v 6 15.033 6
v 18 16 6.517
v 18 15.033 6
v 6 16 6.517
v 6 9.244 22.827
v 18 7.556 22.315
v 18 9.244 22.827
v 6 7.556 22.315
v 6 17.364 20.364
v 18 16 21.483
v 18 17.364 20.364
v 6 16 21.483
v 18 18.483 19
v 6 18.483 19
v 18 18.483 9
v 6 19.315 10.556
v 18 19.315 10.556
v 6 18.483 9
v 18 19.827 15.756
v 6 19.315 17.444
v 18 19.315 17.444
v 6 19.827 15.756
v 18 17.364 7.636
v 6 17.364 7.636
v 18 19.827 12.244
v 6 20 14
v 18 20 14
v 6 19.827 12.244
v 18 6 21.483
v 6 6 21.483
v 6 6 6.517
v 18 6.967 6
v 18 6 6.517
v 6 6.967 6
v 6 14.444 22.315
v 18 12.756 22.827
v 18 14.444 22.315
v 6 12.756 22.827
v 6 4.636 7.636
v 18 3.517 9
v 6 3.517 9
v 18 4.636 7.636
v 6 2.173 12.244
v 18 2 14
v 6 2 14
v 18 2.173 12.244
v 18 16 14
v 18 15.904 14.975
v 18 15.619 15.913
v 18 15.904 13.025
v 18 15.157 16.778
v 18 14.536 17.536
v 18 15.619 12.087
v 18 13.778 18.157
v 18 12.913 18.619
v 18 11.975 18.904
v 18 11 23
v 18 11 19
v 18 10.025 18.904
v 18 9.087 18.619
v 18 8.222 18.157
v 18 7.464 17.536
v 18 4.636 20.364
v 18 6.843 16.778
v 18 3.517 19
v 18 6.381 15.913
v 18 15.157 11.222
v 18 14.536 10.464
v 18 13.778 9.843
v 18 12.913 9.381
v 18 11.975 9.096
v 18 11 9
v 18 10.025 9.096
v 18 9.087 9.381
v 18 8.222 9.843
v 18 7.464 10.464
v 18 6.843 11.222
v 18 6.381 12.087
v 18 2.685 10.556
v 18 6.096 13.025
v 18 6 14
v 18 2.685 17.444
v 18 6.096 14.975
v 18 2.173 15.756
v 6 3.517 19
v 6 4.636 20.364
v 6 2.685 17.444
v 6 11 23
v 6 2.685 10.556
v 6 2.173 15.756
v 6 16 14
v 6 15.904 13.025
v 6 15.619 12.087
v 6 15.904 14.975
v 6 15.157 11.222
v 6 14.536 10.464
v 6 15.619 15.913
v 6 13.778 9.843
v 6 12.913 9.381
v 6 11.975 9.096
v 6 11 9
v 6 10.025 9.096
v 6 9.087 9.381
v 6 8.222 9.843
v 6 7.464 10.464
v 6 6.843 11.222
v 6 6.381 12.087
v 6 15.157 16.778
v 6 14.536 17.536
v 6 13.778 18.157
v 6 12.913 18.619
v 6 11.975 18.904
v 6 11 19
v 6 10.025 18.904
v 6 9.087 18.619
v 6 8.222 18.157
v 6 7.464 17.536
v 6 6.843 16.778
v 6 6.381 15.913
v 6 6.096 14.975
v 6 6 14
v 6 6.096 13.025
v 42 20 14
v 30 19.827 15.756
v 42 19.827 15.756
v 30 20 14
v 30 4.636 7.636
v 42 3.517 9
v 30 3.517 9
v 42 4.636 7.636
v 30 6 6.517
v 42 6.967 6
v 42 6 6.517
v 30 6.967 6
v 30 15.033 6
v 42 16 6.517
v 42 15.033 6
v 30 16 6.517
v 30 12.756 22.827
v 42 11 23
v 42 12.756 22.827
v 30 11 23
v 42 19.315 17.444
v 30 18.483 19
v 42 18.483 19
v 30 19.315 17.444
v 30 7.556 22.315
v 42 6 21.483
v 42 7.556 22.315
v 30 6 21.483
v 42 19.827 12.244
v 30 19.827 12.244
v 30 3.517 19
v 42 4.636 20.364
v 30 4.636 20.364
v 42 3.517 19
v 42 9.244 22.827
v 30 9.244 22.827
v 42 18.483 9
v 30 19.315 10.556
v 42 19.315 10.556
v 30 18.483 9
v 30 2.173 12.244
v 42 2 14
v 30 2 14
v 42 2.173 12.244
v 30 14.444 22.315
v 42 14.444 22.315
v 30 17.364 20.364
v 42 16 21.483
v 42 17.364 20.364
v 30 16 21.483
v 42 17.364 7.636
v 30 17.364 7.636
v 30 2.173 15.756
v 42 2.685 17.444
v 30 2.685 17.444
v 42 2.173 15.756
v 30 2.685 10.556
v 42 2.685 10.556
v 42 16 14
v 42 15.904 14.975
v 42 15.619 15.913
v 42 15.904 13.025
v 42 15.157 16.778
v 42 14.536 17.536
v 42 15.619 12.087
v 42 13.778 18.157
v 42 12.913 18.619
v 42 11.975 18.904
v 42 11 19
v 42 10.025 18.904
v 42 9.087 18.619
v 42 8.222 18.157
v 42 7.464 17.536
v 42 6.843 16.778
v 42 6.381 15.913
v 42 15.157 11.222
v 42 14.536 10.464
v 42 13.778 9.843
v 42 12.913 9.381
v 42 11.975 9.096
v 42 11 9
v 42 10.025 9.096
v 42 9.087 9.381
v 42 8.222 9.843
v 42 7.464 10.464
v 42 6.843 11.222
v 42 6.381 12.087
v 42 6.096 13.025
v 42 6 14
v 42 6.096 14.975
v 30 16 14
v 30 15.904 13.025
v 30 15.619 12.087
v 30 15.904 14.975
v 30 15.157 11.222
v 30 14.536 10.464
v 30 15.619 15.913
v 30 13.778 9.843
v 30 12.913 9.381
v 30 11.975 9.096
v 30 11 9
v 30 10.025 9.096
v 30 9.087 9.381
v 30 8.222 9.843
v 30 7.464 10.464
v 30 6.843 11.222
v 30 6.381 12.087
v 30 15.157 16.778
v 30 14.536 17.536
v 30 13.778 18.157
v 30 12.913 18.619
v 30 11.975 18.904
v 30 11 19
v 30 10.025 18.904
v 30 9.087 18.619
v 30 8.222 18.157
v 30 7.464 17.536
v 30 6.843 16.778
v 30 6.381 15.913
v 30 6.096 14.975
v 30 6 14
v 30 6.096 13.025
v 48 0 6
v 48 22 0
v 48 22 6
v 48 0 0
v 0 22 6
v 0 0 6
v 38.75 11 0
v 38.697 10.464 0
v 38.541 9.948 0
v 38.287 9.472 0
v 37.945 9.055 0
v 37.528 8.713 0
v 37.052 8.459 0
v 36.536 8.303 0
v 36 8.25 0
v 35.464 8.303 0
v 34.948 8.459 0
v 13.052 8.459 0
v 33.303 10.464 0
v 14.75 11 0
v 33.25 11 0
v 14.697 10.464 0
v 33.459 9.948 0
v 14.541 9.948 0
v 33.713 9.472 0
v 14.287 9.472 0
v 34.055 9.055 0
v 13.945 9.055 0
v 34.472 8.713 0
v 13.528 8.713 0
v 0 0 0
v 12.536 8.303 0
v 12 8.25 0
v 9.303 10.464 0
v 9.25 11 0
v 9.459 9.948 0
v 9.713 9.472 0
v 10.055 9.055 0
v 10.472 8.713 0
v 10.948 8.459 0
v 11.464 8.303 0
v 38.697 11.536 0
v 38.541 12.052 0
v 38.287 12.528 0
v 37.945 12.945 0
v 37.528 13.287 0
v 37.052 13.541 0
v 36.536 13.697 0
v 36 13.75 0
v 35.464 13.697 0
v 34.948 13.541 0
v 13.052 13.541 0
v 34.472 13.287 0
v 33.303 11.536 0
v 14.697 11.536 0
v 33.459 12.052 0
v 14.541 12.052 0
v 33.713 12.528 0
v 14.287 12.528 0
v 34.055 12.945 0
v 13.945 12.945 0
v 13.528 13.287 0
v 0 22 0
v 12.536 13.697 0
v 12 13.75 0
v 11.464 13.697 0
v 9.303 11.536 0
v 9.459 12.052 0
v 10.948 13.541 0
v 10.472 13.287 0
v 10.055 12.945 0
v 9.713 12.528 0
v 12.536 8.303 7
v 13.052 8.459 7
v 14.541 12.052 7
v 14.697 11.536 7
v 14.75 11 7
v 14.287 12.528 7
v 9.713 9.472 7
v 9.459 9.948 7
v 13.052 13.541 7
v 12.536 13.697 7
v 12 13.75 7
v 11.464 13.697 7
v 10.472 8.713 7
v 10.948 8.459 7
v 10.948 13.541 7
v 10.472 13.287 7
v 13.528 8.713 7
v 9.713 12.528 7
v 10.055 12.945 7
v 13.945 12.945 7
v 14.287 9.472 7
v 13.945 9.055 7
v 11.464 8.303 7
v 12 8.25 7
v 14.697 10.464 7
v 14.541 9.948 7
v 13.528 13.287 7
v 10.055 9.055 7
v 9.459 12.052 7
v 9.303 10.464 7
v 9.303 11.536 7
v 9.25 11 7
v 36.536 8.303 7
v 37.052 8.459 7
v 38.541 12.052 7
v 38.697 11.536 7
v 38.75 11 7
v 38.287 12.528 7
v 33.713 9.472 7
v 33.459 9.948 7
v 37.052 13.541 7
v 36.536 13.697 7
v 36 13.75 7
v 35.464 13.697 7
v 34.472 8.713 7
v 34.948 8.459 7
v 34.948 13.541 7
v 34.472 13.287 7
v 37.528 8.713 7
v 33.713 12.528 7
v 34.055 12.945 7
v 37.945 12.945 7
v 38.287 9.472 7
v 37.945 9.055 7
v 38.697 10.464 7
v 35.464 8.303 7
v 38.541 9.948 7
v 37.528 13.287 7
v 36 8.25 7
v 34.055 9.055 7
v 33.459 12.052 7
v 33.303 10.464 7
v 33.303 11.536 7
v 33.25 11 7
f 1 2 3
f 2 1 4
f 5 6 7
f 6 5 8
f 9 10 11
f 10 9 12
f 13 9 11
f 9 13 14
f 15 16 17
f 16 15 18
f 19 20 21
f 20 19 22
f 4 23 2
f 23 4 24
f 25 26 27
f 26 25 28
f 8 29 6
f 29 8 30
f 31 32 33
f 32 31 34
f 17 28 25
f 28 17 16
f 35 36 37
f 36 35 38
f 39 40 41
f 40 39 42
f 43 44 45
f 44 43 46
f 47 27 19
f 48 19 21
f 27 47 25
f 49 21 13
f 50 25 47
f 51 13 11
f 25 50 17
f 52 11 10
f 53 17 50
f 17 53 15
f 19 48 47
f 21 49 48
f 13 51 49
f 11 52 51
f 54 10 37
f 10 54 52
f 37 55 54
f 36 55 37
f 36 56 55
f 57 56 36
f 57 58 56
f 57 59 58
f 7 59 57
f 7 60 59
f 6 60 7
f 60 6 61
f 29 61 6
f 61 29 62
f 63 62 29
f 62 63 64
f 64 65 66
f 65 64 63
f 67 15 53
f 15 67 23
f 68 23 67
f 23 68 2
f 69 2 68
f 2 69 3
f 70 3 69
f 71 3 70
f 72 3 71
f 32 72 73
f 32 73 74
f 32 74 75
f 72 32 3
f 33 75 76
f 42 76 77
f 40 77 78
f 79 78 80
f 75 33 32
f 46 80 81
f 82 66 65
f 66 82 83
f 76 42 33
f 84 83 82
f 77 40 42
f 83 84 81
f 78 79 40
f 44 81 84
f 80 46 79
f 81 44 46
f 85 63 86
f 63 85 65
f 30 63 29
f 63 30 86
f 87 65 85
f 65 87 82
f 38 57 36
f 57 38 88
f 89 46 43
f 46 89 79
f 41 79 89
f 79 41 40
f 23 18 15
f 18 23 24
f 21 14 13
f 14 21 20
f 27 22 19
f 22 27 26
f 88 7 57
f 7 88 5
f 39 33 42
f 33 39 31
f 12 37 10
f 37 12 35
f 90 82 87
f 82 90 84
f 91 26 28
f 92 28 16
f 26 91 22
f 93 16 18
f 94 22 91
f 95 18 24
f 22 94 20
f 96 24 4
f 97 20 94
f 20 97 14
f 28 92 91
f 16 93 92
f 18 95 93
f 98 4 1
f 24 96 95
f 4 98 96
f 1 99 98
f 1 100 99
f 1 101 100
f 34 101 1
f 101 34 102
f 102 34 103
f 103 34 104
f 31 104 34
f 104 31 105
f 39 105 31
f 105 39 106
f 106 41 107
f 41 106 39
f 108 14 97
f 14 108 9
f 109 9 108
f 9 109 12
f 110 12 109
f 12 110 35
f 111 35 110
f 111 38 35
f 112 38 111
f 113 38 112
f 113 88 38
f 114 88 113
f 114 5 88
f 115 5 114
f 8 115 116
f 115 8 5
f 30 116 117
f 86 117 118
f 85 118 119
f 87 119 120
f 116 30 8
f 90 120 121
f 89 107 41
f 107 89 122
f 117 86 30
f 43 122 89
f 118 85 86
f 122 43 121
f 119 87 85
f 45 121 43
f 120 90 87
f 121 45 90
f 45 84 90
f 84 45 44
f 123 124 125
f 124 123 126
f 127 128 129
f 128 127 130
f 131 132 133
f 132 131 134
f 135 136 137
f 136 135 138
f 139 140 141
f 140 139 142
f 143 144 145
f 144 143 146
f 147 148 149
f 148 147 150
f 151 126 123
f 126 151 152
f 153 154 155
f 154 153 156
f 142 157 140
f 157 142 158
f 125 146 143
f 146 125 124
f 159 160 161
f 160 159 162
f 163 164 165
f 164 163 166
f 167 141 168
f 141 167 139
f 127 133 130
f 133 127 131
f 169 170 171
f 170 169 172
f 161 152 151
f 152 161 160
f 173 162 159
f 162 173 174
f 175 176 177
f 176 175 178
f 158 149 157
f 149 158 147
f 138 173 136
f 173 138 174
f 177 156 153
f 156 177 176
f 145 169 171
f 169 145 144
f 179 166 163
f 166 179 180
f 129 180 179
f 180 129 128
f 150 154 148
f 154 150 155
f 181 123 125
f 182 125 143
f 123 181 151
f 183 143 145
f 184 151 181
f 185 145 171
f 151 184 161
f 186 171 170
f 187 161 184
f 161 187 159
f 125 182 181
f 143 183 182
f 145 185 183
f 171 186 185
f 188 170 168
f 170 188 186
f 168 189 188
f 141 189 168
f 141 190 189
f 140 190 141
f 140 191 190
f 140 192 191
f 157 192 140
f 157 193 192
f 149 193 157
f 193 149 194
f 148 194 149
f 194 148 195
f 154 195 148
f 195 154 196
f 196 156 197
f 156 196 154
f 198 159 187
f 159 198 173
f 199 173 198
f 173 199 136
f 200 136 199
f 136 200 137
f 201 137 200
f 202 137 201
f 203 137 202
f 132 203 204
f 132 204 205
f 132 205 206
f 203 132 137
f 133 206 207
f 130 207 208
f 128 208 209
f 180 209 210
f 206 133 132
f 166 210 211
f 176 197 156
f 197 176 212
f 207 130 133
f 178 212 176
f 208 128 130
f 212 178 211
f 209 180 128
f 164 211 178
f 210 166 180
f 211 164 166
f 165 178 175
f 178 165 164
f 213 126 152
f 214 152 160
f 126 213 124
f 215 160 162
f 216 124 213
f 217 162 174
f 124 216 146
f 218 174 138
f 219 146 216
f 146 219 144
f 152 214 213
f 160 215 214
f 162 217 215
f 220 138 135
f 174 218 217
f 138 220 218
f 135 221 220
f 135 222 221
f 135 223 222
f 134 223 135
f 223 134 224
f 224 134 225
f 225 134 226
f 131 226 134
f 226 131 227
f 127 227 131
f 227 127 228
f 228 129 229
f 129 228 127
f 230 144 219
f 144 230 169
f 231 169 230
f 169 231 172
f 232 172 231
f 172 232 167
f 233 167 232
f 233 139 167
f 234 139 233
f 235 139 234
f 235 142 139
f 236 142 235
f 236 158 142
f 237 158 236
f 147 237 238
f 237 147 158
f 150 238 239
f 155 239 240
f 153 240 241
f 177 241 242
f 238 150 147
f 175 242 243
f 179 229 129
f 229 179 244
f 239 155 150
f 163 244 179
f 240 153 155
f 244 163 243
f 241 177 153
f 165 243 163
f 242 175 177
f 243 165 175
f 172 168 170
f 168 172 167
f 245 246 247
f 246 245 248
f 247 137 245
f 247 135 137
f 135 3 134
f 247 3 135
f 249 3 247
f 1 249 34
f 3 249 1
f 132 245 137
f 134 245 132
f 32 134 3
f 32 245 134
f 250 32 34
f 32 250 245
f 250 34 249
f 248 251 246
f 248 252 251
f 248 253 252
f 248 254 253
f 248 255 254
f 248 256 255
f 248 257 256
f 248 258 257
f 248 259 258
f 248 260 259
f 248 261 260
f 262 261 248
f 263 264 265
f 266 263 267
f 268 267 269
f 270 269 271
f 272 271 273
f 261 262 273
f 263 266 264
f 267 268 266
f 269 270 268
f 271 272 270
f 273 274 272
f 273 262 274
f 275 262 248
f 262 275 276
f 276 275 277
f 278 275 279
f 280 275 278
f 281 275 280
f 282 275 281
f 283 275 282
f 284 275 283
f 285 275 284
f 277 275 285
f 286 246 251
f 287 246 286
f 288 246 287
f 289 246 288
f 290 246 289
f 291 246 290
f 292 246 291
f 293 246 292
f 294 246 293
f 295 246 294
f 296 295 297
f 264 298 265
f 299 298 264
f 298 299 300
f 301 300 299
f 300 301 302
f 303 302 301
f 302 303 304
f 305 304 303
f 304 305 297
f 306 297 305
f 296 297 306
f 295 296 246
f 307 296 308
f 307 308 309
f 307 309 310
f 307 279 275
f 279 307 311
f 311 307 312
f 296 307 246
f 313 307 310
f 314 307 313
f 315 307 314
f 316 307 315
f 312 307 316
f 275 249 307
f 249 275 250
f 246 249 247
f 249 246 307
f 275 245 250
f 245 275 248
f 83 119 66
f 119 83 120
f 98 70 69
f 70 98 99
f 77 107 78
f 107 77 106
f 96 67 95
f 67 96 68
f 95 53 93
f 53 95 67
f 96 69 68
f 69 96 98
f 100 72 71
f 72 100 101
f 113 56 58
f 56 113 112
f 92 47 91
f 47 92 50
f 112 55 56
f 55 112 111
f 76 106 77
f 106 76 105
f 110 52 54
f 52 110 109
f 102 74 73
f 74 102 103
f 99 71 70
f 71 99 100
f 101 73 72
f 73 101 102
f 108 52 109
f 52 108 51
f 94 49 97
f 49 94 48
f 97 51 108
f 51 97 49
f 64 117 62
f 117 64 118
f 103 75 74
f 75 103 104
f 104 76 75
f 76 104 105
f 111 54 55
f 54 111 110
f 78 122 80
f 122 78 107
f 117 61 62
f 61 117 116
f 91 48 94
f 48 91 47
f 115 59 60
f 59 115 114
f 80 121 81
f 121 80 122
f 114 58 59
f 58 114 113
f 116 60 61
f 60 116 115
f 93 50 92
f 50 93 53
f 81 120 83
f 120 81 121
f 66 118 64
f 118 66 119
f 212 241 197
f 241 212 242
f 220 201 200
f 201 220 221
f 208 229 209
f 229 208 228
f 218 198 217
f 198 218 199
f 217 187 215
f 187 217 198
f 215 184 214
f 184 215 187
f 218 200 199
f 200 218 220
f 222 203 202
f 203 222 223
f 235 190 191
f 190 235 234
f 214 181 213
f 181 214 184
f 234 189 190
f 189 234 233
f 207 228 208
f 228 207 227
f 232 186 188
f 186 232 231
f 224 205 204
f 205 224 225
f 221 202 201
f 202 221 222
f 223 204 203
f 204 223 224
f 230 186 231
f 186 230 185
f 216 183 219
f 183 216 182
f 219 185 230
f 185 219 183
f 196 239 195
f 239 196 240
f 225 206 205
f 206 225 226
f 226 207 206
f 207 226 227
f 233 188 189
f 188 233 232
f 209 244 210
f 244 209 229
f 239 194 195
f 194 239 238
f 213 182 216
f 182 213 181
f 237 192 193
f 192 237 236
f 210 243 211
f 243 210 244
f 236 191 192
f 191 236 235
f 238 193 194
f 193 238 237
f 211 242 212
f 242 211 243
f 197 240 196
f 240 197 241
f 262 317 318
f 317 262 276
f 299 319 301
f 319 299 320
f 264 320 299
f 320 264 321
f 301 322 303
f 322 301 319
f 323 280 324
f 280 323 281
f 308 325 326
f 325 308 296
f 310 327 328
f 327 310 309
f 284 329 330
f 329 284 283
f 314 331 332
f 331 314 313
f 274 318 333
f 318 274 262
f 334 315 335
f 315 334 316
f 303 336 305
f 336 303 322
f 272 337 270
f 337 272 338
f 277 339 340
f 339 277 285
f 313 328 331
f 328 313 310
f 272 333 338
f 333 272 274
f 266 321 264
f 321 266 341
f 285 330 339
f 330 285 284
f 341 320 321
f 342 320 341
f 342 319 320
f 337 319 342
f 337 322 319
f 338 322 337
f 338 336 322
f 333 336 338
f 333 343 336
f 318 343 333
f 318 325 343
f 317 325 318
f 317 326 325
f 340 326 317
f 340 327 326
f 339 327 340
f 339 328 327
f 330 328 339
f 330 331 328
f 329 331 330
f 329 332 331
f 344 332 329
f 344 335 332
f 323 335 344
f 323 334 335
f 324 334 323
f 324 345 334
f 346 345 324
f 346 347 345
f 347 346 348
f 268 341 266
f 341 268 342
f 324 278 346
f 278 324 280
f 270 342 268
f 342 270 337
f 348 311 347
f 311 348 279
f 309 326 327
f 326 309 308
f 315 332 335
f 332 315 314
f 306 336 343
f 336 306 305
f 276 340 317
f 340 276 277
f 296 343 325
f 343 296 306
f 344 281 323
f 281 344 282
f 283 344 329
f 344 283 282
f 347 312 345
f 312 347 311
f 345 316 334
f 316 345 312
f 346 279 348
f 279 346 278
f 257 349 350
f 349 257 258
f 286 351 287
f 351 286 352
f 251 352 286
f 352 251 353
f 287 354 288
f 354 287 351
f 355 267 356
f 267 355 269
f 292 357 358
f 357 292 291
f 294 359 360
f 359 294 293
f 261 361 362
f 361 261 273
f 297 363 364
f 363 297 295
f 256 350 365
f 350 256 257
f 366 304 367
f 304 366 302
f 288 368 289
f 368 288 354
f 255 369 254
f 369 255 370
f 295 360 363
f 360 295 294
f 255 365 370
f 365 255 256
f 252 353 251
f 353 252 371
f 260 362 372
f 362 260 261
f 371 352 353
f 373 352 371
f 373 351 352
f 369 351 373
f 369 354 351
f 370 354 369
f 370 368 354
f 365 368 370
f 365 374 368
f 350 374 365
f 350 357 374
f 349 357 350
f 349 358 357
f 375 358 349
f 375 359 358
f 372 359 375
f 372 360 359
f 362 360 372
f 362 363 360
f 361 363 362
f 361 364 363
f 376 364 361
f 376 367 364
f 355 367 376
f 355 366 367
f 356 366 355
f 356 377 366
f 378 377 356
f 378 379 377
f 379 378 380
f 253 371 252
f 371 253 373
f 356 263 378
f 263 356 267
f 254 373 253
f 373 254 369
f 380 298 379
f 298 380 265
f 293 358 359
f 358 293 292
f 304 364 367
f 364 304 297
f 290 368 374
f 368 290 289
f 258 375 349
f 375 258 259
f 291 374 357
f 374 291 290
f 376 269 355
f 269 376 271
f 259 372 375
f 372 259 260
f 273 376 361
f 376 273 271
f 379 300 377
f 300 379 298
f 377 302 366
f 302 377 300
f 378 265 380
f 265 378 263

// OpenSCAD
$fn = 32;

// ----------------------------------------------------------------------
// Cable clip: cable 10 mm, clamp 18 mm, base 48 mm
// ----------------------------------------------------------------------

// --- parameters (mm) ---
base_w = 48;              // base length, X
base_d = 22;              // base width, Y
base_t = 6;               // base thickness
clamp_d = 18;             // clamp outside diameter
wall_t = 4;               // clamp wall
cable_d = 10;             // cable opening
ring_w = 12;              // clamp width along the cable
screw_d = 5.5;            // screw clearance
sink = 1;                 // overlap of the clamp into the base
pitch = 24;               // distance between the two clamps

module base() {
  cube([base_w, base_d, base_t]);
}

module clamps() {
  for (sx = [-1, 1])
    translate([base_w / 2 + sx * pitch / 2, base_d / 2, base_t + clamp_d / 2 - sink]) rotate([0, 90, 0])
      cylinder(h = ring_w, d = clamp_d, center = true);
}

difference() {
  union() {
    base();
    clamps();
  }
  for (sx = [-1, 1])
    translate([base_w / 2 + sx * pitch / 2, base_d / 2, base_t + clamp_d / 2 - sink]) rotate([0, 90, 0]) translate([0, 0, -ring_w / 2 - 1]) cylinder(h = ring_w + 2, d = cable_d);
  translate([12, base_d / 2, -1]) cylinder(h = base_t + 2, d = screw_d);
  translate([36, base_d / 2, -1]) cylinder(h = base_t + 2, d = screw_d);
}
